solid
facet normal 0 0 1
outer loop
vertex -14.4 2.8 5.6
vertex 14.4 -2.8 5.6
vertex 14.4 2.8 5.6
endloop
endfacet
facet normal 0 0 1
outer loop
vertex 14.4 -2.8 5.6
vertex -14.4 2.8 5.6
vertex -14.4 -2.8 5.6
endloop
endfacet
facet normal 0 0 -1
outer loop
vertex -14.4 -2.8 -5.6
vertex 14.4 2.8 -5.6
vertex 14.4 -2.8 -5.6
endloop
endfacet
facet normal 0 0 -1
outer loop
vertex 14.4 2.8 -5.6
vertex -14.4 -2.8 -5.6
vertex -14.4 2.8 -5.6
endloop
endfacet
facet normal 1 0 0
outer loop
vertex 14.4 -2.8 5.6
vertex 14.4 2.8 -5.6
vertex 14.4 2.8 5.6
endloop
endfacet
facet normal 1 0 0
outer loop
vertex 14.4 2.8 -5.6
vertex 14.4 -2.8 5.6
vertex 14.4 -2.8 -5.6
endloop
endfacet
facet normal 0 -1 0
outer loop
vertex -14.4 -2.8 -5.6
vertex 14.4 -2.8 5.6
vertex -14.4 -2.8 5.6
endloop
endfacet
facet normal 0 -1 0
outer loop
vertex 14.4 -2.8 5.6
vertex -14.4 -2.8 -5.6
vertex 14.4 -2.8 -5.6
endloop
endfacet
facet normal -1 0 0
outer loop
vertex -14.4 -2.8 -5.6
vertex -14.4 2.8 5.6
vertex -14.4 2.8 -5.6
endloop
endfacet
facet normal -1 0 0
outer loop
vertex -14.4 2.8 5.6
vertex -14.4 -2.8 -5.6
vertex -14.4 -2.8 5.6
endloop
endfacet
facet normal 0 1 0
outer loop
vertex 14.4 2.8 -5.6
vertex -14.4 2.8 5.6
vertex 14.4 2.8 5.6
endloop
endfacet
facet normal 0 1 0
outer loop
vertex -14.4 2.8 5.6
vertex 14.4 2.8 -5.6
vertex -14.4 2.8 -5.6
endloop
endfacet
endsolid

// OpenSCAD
// file: ../p/box.scad
use <../lib.scad>
function ldraw_lib__box() = [
// 0 Box 6 (six faces)
// 0 Name: box.dat
// 0 Author: James Jessiman
// 0 !LDRAW_ORG Primitive UPDATE 2002-05
// 0 !LICENSE Licensed under CC BY 4.0 : see CAreadme.txt
// 
// 0 BFC CERTIFY CCW
  [0,"BFC","CERTIFY"],
  [0,"BFC","CCW"],
// 
// 0 !HISTORY 2002-08-22 [sbliss] Applied BFC
// 0 !HISTORY 2002-11-30 [PTadmin] Official Update 2002-05
// 0 !HISTORY 2007-06-24 [PTadmin] Header formatted for Contributor Agreement
// 0 !HISTORY 2008-07-01 [PTadmin] Official Update 2008-01
// 
// 
// 2 24 1 1 1 -1 1 1
  [2,24,1,1,1,-1,1,1],
// 2 24 -1 1 1 -1 1 -1
  [2,24,-1,1,1,-1,1,-1],
// 2 24 -1 1 -1 1 1 -1
  [2,24,-1,1,-1,1,1,-1],
// 2 24 1 1 -1 1 1 1
  [2,24,1,1,-1,1,1,1],
// 2 24 1 -1 1 -1 -1 1
  [2,24,1,-1,1,-1,-1,1],
// 2 24 -1 -1 1 -1 -1 -1
  [2,24,-1,-1,1,-1,-1,-1],
// 2 24 -1 -1 -1 1 -1 -1
  [2,24,-1,-1,-1,1,-1,-1],
// 2 24 1 -1 -1 1 -1 1
  [2,24,1,-1,-1,1,-1,1],
// 2 24 1 -1 1 1 1 1
  [2,24,1,-1,1,1,1,1],
// 2 24 -1 -1 1 -1 1 1
  [2,24,-1,-1,1,-1,1,1],
// 2 24 1 -1 -1 1 1 -1
  [2,24,1,-1,-1,1,1,-1],
// 2 24 -1 -1 -1 -1 1 -1
  [2,24,-1,-1,-1,-1,1,-1],
// 4 16 1 1 1 1 1 -1 -1 1 -1 -1 1 1
  [4,16,1,1,1,1,1,-1,-1,1,-1,-1,1,1],
// 4 16 -1 -1 -1 1 -1 -1 1 -1 1 -1 -1 1
  [4,16,-1,-1,-1,1,-1,-1,1,-1,1,-1,-1,1],
// 4 16 -1 -1 1 1 -1 1 1 1 1 -1 1 1
  [4,16,-1,-1,1,1,-1,1,1,1,1,-1,1,1],
// 4 16 -1 -1 -1 -1 -1 1 -1 1 1 -1 1 -1
  [4,16,-1,-1,-1,-1,-1,1,-1,1,1,-1,1,-1],
// 4 16 1 -1 -1 -1 -1 -1 -1 1 -1 1 1 -1
  [4,16,1,-1,-1,-1,-1,-1,-1,1,-1,1,1,-1],
// 4 16 1 -1 1 1 -1 -1 1 1 -1 1 1 1
  [4,16,1,-1,1,1,-1,-1,1,1,-1,1,1,1],
// 0
];
module ldraw_lib__box(step=0, col=false, unit=2/5, alt=false, line=0.2, solid=!$preview)
    makepoly(ldraw_lib__box(), step=step, col=col, unit=unit, alt=alt, line=line, solid=solid);
ldraw_lib__box(line=0.2);
// main file
use <../lib.scad>
use <../p/box.scad>
function ldraw_lib__u9400() = [
// 0 ~Electric Sound Brick  4 x  4 x  1.667 Loudspeaker
// 0 Name: u9400.dat
// 0 Author: Philippe Hurbain [Philo]
// 0 !LDRAW_ORG Part UPDATE 2025-08
// 0 !LICENSE Licensed under CC BY 4.0 : see CAreadme.txt
// 
// 0 BFC CERTIFY CCW
  [0,"BFC","CERTIFY"],
  [0,"BFC","CCW"],
// 
// 0 !HISTORY 2025-08-31 [OrionP] Official Update 2025-08
// 
// 0 // Details not modeled
// 
// 1 16 0 0 0 0 0 36 0 -14 0 7 0 0 box.dat
  [1,16,0,0,0,0,0,36,0,-14,0,7,0,0, ldraw_lib__box()],
];
module ldraw_lib__u9400(step=0, col=false, unit=2/5, alt=false, line=0.2, solid=!$preview)
    makepoly(ldraw_lib__u9400(), step=step, col=col, unit=unit, alt=alt, line=line, solid=solid);
ldraw_lib__u9400(line=0.2);
